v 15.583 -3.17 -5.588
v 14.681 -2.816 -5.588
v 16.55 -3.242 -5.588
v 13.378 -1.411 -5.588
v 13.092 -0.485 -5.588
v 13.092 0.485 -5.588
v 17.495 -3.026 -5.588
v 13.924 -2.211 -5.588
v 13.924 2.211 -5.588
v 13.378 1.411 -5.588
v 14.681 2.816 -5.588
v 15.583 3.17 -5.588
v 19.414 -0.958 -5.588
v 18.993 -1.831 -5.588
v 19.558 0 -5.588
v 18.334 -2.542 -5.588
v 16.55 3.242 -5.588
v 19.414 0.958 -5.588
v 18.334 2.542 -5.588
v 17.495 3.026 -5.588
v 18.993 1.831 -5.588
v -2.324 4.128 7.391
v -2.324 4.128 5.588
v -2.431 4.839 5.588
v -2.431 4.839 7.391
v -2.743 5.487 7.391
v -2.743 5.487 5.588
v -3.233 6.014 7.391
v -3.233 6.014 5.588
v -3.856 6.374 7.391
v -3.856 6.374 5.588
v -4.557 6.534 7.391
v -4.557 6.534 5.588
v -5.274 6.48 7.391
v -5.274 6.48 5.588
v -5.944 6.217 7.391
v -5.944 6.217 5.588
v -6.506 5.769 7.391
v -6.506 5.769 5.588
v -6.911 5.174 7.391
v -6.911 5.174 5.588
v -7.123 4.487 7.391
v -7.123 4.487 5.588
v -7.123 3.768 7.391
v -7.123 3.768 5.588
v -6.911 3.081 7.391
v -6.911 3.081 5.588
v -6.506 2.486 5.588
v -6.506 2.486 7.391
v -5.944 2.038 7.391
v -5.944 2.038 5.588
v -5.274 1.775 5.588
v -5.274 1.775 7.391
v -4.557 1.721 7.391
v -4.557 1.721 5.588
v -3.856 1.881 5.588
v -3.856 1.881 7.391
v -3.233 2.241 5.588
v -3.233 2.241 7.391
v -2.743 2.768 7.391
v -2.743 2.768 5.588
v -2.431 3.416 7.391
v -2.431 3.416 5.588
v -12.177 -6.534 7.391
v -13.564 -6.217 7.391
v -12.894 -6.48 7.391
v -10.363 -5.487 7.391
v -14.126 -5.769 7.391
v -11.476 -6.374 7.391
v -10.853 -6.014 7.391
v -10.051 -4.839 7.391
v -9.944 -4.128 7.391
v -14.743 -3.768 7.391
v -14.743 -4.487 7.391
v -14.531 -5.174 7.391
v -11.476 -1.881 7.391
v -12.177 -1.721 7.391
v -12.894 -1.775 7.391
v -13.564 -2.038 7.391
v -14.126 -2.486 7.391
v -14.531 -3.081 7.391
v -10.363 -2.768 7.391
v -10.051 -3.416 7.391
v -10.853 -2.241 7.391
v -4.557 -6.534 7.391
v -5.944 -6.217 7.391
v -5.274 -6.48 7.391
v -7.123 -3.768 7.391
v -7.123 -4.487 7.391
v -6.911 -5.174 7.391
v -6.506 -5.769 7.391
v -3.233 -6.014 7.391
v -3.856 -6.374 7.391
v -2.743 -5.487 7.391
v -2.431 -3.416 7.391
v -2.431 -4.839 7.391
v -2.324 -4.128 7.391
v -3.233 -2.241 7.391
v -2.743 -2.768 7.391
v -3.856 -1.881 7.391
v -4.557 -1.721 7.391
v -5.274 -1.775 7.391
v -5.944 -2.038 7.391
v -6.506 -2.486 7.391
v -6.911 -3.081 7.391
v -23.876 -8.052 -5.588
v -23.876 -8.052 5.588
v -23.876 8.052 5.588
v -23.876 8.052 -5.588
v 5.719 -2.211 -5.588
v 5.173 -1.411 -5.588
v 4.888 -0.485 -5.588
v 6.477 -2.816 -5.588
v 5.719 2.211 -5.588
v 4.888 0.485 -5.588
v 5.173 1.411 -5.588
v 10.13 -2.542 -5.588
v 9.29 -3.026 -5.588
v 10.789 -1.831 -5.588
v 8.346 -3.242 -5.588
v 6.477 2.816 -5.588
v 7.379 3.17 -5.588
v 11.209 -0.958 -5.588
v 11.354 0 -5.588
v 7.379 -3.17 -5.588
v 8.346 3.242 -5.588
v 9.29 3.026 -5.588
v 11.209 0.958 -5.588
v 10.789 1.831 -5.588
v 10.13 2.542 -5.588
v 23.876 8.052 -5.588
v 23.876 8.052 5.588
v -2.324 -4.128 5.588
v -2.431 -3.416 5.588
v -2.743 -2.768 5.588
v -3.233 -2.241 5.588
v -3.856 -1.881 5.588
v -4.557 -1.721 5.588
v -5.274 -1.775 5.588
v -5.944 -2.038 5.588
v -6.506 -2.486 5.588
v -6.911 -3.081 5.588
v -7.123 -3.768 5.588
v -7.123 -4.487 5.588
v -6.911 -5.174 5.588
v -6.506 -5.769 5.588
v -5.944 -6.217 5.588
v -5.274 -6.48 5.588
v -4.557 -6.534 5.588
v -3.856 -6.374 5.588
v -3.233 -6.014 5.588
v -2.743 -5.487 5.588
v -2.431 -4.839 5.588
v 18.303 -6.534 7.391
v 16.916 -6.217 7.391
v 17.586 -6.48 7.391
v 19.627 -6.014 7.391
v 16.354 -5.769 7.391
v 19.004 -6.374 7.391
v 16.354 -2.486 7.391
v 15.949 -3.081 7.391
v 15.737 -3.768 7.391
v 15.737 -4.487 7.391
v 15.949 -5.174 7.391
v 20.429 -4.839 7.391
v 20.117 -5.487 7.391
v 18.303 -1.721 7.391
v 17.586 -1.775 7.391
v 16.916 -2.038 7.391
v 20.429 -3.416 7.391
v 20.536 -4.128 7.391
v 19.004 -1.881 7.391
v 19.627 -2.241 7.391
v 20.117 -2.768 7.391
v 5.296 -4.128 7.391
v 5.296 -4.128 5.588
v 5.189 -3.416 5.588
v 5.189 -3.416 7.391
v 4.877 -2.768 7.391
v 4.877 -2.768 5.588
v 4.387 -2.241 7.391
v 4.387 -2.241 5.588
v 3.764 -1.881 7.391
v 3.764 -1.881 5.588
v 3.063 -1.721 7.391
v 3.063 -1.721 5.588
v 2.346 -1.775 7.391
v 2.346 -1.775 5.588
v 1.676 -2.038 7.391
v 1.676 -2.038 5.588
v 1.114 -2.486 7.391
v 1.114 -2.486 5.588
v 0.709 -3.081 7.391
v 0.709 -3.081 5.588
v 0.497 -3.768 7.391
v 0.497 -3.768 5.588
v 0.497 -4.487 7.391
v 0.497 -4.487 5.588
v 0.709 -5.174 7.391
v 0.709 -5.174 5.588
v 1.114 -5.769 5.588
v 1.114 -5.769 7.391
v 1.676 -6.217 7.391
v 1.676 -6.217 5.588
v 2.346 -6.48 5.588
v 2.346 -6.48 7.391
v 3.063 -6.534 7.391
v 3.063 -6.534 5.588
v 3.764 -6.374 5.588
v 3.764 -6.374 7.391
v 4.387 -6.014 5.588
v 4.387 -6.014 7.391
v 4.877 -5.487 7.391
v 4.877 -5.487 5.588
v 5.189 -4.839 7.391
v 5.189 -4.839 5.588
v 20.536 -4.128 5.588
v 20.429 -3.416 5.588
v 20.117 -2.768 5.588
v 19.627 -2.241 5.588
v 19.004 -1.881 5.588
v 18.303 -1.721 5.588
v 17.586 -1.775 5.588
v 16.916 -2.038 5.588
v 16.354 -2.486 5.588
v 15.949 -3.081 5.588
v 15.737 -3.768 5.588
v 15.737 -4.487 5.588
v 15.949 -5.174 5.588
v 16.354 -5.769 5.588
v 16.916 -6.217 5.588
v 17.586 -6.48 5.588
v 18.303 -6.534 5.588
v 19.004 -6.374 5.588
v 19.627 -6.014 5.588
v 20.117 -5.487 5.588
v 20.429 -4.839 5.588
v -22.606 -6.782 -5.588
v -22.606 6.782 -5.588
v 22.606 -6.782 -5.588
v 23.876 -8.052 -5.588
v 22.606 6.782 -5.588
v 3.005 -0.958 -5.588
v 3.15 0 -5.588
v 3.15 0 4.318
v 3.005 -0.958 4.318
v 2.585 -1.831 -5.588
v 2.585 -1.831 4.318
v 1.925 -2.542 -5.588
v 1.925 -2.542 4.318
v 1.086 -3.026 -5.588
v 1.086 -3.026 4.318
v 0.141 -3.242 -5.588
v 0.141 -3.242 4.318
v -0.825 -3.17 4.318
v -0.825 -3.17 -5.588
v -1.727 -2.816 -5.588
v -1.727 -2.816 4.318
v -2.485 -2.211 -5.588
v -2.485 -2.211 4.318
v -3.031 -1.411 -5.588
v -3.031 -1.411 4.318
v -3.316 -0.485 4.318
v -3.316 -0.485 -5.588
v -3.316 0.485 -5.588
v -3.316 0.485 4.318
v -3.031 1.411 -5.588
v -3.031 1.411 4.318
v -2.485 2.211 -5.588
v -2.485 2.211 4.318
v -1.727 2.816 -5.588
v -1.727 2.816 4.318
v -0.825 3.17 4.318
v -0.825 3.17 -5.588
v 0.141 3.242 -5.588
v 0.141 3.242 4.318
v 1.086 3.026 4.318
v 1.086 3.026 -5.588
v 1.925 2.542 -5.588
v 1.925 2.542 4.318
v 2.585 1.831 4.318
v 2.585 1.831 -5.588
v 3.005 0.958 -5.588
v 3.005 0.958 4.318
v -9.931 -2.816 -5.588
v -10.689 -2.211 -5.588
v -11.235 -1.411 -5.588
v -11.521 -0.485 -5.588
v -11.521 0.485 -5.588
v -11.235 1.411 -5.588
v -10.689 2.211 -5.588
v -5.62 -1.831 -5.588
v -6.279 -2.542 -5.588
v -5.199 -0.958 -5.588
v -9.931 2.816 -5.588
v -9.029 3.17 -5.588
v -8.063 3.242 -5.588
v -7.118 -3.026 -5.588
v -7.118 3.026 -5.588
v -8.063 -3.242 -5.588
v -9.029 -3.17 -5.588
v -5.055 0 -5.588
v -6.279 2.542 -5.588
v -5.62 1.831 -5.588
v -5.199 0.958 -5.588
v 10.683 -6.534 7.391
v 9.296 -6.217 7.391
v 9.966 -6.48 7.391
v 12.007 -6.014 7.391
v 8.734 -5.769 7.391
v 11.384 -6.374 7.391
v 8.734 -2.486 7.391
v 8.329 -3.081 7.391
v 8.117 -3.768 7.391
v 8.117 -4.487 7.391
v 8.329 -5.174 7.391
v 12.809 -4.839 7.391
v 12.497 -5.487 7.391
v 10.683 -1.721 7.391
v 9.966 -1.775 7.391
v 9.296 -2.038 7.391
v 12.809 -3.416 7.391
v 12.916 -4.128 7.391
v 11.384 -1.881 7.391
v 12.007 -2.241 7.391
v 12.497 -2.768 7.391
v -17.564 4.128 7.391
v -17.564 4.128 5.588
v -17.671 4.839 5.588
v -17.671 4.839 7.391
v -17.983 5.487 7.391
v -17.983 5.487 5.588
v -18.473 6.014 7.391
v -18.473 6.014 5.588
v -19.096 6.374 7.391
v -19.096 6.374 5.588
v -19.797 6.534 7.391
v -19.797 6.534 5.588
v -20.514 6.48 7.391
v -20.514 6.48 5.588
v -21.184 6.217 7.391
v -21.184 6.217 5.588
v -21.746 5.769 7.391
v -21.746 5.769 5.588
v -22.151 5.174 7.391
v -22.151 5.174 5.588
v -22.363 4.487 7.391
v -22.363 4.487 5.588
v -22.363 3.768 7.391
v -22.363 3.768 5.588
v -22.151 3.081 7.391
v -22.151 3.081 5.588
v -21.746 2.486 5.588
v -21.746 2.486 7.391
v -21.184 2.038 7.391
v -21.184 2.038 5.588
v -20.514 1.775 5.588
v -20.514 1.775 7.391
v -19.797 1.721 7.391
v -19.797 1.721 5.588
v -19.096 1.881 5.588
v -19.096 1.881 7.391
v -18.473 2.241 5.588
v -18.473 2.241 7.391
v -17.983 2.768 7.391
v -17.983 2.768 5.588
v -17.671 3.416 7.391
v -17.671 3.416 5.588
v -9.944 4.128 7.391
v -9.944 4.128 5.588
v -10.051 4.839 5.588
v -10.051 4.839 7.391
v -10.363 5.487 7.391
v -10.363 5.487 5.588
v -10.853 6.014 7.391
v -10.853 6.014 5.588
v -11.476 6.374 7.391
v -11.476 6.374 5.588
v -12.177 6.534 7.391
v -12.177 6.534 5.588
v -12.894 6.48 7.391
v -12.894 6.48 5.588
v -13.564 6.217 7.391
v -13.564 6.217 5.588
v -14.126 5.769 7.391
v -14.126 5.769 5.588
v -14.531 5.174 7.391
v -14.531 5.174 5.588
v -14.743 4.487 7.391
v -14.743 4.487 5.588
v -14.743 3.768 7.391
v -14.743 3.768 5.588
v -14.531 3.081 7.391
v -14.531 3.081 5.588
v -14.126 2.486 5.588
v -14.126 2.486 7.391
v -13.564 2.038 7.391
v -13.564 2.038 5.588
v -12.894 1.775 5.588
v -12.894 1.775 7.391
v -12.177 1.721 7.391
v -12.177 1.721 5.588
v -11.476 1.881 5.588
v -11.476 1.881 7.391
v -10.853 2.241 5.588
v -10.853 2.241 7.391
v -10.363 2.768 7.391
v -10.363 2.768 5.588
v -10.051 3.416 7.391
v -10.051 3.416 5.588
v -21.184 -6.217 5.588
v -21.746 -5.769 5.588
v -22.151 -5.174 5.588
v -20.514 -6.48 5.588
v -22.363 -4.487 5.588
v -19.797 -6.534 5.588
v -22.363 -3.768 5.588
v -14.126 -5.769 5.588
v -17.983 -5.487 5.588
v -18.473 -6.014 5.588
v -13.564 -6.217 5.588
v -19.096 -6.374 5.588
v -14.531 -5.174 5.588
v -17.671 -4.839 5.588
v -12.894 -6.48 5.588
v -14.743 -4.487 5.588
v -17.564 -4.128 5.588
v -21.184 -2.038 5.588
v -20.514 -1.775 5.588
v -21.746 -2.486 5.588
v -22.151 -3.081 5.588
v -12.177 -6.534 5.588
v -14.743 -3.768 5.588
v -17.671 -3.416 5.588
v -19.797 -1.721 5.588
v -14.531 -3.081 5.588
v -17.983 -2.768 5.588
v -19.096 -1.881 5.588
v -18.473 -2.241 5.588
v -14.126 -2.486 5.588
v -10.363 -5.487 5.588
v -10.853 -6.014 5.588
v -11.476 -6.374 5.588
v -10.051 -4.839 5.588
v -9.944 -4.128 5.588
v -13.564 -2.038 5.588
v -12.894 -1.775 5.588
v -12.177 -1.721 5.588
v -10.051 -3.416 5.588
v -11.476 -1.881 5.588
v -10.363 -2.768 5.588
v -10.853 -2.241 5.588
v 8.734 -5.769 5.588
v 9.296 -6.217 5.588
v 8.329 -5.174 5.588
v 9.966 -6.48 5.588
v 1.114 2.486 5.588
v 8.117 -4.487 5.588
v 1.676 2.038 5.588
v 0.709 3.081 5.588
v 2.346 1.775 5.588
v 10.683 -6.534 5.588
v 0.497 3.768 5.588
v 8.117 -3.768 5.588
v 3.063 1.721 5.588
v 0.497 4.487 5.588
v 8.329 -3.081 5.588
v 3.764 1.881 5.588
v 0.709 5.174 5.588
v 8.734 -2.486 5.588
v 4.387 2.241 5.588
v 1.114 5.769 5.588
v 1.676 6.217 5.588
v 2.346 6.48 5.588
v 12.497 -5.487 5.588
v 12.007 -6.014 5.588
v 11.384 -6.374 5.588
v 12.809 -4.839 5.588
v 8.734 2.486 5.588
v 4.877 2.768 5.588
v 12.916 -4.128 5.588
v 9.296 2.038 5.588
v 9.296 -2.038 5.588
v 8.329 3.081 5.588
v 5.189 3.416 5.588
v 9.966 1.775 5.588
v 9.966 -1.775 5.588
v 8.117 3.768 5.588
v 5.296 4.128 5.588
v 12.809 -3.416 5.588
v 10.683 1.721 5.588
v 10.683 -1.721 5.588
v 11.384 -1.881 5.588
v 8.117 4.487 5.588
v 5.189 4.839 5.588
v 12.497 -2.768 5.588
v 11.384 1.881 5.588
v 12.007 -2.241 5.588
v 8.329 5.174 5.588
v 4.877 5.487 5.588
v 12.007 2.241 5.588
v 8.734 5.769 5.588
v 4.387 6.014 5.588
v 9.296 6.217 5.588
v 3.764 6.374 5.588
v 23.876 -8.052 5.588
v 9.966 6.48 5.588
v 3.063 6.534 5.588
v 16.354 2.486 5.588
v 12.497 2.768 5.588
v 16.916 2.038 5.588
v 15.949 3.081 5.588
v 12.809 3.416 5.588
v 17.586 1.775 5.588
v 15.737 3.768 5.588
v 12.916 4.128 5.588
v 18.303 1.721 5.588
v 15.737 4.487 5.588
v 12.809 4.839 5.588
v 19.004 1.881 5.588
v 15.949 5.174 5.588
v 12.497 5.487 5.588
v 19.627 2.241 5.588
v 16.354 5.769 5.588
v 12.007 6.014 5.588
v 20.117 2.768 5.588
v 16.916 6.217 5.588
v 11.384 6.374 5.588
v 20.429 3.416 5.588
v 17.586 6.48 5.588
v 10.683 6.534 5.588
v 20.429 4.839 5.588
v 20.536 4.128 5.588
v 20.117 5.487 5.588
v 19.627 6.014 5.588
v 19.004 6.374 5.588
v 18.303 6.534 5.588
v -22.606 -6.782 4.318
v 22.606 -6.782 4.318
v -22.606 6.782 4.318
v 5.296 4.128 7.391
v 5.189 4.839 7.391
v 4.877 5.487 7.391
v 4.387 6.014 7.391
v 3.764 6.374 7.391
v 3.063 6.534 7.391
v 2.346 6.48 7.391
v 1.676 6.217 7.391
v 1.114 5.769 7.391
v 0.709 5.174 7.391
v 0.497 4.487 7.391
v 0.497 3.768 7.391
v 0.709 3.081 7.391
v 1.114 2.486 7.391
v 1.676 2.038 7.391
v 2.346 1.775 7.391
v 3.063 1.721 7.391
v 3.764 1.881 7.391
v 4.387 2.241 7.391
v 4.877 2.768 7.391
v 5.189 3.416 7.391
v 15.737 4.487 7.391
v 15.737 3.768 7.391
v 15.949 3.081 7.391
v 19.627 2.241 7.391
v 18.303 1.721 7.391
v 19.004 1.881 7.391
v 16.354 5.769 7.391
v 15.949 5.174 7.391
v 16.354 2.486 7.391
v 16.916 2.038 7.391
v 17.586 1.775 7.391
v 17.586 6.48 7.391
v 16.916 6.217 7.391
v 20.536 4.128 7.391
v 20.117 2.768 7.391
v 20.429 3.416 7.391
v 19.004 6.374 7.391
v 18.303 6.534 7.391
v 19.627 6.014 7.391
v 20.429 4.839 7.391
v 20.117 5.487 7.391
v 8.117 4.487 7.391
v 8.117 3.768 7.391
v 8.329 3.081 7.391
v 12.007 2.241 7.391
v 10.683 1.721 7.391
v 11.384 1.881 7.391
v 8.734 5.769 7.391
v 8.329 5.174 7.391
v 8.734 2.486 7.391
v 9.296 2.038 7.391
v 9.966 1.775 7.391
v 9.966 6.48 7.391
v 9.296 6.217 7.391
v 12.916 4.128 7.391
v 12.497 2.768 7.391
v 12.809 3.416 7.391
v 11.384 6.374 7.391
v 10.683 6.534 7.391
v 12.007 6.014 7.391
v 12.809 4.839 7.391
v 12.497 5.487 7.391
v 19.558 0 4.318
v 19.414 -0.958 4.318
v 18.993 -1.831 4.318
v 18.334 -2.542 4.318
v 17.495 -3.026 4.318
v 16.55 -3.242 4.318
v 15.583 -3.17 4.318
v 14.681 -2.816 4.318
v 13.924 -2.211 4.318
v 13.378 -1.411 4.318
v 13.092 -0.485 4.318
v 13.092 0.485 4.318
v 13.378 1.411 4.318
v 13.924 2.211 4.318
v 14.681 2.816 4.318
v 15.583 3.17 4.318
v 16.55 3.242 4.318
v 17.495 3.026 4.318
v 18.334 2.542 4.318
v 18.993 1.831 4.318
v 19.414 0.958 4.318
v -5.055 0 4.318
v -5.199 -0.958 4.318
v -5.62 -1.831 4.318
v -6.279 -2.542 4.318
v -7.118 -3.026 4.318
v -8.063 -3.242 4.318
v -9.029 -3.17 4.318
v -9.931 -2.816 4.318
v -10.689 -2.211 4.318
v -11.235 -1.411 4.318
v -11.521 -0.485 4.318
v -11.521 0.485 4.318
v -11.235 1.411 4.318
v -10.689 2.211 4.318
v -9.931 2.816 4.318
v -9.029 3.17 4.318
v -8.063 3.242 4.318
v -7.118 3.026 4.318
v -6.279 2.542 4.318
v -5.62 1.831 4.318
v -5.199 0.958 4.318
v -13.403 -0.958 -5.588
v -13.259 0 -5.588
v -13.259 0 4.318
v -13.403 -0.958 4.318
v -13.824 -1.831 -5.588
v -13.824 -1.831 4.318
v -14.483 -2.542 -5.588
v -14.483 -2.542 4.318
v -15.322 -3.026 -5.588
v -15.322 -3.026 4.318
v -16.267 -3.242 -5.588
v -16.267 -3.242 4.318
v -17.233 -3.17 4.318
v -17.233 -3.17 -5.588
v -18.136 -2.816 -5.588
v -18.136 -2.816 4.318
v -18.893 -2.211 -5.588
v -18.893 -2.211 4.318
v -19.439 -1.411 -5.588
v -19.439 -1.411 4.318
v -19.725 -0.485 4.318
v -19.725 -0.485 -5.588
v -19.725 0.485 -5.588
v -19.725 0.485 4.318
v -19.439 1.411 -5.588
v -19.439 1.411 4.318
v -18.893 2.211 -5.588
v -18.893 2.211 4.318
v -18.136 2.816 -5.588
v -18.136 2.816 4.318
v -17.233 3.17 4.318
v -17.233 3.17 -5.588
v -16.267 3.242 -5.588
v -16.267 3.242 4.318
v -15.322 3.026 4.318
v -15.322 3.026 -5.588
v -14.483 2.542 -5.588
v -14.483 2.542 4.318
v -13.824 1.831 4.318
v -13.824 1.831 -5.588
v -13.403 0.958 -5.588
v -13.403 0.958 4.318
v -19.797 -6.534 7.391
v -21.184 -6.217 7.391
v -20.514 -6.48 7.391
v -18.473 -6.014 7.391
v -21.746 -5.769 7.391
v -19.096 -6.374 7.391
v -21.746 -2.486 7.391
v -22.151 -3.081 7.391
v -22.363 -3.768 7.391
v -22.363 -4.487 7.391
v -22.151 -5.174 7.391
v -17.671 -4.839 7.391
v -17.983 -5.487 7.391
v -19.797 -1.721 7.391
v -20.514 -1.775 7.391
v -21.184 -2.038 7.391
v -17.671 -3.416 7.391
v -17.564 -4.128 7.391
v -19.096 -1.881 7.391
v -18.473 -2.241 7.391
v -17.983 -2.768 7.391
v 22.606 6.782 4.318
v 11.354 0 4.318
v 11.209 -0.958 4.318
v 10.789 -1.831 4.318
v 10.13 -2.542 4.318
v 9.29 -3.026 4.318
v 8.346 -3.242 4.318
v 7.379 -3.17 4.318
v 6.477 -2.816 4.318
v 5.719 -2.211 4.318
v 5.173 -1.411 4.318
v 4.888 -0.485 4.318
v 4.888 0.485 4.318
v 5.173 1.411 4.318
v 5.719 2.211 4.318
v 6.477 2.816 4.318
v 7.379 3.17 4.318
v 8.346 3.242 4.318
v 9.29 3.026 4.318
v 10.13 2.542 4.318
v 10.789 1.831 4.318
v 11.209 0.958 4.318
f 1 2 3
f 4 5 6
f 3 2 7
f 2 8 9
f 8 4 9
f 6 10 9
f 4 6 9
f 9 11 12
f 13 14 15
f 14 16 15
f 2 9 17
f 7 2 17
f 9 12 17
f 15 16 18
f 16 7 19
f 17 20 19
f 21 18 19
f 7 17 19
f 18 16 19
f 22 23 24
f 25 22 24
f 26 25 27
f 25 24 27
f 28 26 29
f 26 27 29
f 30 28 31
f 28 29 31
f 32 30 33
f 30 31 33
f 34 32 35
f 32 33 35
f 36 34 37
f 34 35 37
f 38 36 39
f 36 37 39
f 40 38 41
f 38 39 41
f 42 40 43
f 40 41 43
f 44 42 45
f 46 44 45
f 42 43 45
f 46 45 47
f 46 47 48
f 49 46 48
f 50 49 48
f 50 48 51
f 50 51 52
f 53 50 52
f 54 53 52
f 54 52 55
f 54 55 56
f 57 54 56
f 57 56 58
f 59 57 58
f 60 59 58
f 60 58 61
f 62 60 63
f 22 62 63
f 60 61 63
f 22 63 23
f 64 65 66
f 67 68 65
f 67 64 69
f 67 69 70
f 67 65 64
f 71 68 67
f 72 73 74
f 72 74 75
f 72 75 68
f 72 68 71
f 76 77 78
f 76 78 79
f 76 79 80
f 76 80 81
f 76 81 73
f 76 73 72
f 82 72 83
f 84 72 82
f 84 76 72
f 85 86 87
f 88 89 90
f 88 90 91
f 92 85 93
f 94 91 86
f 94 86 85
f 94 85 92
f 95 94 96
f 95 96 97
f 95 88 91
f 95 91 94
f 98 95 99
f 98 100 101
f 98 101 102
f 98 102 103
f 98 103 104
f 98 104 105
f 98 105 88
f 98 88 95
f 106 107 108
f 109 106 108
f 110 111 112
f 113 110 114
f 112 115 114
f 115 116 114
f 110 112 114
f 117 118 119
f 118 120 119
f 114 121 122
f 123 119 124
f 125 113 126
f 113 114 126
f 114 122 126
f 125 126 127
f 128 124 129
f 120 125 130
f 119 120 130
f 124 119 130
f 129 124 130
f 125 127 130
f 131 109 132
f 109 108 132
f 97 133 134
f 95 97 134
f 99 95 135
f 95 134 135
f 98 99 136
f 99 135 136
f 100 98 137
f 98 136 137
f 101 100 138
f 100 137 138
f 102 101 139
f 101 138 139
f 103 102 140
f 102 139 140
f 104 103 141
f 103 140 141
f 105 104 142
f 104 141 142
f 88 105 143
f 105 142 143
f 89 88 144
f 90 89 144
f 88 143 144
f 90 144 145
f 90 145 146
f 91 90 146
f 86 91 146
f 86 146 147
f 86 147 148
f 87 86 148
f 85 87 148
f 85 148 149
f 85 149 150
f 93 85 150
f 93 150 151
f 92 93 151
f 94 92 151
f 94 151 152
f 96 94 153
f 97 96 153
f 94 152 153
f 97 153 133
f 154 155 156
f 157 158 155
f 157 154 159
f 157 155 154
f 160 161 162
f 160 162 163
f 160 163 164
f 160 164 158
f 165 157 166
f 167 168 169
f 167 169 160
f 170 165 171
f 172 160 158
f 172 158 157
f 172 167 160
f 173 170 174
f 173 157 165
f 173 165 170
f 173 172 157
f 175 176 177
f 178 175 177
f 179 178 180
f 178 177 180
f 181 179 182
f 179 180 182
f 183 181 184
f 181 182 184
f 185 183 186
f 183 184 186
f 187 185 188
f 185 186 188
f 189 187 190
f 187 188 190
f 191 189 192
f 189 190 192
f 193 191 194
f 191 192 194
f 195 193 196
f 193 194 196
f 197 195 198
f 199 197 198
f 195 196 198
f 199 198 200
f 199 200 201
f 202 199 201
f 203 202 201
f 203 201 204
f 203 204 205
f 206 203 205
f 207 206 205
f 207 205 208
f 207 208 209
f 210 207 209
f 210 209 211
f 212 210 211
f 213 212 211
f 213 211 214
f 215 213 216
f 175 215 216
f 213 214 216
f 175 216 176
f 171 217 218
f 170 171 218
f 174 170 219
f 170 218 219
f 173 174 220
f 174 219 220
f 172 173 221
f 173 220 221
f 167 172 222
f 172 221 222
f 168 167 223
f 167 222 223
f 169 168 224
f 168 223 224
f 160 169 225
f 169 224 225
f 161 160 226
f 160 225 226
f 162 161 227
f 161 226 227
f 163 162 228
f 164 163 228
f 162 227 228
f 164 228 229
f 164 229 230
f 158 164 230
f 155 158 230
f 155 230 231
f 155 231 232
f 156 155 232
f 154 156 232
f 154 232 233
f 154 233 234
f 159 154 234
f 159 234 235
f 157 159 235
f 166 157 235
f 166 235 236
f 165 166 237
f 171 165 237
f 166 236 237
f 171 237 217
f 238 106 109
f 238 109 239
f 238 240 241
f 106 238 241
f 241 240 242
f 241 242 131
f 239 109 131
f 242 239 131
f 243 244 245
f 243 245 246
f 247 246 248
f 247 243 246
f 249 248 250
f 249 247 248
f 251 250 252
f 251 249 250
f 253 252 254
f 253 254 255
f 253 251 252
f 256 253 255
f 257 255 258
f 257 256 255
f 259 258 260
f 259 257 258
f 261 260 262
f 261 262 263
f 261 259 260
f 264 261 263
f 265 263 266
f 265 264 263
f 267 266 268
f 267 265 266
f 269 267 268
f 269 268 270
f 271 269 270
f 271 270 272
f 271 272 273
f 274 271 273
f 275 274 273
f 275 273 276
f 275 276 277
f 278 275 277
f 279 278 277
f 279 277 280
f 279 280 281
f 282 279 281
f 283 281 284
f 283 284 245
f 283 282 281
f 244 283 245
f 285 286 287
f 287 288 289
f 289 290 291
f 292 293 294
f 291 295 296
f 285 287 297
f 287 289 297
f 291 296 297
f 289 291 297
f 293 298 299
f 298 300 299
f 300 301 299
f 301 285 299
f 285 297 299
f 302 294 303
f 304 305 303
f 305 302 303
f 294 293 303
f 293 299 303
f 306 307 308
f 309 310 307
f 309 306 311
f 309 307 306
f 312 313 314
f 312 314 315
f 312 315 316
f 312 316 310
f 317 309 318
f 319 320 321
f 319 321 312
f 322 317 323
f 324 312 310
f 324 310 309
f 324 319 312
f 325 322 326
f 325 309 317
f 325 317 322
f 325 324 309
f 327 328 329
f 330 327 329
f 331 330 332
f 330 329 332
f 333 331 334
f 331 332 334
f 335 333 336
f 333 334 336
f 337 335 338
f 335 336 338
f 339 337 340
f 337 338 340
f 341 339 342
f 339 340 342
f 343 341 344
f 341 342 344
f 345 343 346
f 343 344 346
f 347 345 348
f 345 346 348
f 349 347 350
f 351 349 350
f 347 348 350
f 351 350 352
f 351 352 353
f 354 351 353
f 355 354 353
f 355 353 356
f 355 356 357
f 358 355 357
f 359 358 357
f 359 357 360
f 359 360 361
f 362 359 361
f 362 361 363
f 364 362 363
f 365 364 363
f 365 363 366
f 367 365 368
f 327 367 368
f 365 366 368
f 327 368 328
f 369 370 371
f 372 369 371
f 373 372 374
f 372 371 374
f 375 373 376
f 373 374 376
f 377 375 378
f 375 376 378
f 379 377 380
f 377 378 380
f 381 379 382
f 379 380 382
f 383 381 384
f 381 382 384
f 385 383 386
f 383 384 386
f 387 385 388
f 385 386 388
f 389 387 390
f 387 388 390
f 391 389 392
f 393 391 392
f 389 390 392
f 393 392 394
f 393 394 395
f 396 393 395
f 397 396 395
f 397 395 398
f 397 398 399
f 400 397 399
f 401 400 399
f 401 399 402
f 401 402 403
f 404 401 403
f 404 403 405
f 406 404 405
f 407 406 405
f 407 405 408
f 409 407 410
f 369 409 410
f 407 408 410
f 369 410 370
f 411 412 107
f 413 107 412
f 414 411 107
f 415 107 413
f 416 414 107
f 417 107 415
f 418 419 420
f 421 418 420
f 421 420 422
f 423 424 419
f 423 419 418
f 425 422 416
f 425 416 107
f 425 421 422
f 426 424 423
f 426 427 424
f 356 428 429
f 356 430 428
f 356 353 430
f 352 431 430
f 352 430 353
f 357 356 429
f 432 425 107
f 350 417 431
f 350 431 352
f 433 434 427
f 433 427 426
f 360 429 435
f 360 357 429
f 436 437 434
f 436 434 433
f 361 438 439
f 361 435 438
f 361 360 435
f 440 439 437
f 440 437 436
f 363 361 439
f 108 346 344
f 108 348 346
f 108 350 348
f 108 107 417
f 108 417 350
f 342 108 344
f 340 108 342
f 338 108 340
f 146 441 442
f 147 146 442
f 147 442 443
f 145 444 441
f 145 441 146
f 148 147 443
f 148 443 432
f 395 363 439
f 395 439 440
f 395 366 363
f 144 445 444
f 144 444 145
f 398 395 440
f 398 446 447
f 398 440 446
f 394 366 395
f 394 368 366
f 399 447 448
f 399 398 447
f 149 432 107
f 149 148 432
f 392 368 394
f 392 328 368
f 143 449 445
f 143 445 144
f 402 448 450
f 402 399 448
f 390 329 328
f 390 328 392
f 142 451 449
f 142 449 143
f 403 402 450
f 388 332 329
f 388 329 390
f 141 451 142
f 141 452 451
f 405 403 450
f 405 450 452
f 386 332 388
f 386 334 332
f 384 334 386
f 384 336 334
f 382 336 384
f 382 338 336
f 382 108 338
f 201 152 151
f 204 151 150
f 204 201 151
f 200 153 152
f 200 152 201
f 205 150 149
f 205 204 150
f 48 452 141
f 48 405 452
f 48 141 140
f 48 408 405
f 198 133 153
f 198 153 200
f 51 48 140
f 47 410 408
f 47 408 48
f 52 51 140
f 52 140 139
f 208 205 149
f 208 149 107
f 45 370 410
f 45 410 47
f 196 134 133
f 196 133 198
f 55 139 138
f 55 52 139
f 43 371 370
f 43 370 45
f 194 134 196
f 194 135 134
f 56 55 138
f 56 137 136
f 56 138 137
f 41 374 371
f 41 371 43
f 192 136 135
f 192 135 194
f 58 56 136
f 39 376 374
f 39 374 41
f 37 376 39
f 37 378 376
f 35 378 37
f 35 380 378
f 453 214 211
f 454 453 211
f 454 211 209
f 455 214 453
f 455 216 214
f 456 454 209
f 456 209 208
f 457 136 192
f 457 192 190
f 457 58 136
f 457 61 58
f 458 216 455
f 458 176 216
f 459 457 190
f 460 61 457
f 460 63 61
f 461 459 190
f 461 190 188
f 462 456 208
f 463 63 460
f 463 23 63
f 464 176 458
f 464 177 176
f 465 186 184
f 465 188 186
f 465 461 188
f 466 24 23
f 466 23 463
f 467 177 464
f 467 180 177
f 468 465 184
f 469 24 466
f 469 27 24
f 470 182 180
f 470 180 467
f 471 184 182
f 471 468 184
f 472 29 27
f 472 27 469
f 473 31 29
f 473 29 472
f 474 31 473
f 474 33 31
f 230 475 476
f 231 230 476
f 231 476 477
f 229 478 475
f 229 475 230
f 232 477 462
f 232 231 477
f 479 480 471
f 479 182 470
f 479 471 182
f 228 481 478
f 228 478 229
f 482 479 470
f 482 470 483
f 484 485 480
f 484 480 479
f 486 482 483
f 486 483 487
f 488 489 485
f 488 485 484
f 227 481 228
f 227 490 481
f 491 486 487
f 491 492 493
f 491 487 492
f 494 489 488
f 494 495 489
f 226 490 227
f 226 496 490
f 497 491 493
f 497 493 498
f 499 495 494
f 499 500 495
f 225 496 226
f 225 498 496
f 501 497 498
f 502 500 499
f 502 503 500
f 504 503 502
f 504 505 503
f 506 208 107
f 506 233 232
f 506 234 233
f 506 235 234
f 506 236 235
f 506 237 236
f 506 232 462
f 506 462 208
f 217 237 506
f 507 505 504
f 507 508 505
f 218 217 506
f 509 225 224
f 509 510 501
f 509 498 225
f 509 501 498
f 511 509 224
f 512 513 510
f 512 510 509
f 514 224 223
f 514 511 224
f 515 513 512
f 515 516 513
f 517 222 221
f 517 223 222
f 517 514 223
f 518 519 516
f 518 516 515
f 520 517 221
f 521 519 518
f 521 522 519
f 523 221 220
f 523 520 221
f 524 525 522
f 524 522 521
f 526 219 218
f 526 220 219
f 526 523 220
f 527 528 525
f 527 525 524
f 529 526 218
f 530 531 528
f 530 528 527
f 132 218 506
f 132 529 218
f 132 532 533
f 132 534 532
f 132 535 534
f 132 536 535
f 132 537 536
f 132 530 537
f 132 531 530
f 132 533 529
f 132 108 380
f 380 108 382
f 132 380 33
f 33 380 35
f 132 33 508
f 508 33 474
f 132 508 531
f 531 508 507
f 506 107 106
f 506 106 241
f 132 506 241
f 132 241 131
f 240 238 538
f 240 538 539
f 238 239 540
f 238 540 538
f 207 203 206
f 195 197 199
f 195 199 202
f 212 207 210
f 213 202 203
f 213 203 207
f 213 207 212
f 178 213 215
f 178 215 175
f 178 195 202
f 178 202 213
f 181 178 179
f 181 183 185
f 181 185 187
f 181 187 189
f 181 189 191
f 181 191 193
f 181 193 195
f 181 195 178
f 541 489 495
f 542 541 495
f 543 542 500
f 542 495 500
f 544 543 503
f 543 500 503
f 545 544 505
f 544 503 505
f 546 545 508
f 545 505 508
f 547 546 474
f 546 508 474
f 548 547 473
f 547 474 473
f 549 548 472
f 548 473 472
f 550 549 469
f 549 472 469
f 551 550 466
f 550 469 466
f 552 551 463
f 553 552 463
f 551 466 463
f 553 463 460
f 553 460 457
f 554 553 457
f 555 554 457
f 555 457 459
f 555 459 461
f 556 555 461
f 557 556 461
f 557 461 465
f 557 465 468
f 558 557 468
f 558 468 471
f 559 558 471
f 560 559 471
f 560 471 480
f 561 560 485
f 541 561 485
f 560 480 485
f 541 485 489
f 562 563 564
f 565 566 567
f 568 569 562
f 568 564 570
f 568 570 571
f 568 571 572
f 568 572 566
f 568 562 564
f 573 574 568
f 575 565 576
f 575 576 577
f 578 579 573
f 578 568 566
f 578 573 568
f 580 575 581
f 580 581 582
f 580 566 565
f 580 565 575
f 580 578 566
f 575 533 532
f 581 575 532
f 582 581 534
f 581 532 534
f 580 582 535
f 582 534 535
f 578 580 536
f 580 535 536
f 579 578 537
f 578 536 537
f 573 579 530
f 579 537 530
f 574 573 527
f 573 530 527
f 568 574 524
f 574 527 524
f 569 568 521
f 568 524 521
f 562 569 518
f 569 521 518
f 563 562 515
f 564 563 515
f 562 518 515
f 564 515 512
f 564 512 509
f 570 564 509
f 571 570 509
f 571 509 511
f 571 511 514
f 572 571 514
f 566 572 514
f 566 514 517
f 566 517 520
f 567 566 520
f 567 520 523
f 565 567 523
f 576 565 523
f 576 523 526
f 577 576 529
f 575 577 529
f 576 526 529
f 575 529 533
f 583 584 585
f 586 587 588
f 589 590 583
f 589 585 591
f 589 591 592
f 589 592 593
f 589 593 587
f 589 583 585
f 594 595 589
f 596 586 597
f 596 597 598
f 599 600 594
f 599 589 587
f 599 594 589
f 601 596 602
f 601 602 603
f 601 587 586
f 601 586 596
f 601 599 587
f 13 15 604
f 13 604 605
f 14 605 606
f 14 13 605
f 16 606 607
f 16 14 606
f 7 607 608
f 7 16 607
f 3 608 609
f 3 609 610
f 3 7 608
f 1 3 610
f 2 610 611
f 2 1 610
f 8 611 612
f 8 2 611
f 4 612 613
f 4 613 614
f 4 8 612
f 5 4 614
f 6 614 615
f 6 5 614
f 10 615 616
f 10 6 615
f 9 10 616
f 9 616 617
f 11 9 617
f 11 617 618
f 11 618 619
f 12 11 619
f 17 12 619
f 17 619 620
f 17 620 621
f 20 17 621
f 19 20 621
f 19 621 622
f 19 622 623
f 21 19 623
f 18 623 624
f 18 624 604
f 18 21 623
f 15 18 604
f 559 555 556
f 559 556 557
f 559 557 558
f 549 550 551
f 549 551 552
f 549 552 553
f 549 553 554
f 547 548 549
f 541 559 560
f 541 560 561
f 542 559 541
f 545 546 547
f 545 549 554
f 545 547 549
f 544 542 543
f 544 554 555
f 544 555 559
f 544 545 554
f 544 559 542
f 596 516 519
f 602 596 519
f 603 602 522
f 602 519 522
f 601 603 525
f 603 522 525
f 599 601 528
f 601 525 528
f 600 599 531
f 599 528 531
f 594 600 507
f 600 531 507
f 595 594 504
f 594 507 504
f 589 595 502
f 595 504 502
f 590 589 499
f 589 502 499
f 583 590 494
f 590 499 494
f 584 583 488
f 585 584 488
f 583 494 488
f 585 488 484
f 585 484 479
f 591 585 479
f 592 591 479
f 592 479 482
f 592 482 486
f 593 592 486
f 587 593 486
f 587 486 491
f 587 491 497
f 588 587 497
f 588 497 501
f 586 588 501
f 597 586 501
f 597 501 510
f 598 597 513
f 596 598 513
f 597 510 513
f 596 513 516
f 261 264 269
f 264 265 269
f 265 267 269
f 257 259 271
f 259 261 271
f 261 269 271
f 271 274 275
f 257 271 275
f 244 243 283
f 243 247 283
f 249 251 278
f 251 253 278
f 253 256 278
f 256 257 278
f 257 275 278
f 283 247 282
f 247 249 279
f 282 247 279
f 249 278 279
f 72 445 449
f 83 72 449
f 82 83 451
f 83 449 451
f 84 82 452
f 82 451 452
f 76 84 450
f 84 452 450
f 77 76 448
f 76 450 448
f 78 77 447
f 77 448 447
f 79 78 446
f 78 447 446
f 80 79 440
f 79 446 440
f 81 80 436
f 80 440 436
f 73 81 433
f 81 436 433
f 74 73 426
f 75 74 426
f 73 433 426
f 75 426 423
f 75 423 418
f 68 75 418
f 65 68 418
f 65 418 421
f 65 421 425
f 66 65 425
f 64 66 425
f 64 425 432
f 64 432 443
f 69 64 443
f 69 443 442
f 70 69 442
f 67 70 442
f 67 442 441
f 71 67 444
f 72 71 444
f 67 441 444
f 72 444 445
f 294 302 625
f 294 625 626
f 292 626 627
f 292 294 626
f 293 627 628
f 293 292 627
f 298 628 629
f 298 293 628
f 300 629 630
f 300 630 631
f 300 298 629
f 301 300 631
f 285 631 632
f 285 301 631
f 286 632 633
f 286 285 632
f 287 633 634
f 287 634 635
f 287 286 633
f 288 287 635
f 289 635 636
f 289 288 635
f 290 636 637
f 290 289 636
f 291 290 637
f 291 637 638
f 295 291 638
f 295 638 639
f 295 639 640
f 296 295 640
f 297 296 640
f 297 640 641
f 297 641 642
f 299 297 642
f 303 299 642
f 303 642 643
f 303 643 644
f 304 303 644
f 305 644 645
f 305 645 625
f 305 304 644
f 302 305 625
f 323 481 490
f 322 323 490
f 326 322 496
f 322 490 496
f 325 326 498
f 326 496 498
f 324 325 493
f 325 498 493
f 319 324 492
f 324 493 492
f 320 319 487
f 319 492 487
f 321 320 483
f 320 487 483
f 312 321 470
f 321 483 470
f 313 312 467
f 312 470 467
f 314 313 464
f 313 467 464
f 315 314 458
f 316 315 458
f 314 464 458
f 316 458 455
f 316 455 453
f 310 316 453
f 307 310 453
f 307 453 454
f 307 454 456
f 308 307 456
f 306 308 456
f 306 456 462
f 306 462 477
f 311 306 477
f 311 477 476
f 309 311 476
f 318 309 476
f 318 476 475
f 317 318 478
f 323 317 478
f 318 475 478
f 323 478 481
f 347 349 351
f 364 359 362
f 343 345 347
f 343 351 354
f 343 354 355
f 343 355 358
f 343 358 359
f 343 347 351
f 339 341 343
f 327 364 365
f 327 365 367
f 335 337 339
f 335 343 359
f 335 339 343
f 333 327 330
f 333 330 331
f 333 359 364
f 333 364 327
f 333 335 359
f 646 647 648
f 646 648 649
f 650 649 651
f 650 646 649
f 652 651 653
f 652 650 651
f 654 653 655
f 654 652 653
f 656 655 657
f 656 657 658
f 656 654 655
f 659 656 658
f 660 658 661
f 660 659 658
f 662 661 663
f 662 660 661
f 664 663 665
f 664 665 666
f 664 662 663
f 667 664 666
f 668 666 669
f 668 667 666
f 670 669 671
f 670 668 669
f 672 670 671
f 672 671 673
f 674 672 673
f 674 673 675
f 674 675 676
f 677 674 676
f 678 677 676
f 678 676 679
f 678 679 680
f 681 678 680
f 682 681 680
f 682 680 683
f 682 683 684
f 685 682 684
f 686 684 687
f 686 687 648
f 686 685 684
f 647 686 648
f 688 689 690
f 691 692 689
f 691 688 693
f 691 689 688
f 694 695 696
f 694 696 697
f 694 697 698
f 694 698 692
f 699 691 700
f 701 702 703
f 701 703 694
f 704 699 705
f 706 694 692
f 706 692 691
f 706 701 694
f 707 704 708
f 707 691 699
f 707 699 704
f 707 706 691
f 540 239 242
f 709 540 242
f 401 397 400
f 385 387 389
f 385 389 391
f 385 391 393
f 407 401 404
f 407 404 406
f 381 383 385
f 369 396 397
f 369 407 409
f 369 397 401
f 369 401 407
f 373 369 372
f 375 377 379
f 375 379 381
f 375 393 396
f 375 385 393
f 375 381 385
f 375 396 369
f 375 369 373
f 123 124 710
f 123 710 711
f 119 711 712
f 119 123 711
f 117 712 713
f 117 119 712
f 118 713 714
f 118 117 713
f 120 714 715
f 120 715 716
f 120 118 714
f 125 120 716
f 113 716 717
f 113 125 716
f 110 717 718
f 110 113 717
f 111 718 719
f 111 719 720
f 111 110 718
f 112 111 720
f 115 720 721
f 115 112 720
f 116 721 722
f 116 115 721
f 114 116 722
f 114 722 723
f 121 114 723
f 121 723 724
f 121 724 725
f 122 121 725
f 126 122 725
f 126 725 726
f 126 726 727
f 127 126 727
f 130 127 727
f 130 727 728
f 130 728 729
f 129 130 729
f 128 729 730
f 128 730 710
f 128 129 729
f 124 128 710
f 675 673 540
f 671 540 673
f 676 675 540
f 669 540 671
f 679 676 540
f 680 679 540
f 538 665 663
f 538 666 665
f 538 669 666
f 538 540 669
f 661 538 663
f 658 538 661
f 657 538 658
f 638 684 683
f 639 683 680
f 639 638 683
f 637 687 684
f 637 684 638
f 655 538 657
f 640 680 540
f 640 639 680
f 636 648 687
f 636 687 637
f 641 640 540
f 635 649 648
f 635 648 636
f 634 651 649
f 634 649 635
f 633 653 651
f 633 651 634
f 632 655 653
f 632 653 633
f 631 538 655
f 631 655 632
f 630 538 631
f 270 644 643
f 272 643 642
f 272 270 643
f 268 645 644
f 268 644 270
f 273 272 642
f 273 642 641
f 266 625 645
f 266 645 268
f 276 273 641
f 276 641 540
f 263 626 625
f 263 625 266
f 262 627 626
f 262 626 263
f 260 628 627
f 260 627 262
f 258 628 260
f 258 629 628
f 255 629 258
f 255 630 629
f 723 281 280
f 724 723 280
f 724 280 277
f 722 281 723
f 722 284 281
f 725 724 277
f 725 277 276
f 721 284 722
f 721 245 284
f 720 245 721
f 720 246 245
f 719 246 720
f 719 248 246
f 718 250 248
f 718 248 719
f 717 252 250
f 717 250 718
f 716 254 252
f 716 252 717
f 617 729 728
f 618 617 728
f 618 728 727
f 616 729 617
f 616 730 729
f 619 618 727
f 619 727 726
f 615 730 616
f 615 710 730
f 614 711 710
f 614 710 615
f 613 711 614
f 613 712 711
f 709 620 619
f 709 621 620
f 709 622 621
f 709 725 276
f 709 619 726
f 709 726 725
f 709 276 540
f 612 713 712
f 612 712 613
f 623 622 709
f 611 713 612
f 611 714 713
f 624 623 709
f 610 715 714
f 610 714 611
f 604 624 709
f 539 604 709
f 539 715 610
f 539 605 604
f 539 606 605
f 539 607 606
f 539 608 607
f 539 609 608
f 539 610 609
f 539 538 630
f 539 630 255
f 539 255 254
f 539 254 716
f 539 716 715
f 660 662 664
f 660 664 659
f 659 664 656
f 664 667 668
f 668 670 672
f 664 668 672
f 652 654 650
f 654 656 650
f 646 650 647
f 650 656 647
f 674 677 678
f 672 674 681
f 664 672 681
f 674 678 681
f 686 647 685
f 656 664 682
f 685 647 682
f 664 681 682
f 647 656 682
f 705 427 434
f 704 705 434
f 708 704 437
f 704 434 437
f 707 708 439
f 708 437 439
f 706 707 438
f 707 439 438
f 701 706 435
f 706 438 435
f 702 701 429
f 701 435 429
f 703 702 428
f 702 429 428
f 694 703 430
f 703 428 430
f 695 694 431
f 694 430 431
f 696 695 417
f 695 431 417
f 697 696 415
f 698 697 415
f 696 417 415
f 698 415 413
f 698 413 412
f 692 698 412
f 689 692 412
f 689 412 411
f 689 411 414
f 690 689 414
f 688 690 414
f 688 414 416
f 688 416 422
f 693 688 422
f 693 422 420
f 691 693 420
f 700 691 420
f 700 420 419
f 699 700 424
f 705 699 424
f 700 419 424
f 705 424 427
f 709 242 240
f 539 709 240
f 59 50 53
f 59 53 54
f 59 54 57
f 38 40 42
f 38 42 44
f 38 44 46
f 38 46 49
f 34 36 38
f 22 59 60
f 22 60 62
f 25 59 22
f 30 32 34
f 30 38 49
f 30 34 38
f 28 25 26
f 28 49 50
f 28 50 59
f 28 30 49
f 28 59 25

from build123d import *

# Parameters (mm, degrees)
F0_W     = 47.752
F0_H     = 16.1036
F1_DEPTH = 5.588
F2_R     = 2.413
F3_DEPTH = 1.8034
F5_W     = 45.212
F5_H     = 13.5636
F5_R     = 3.2512
F6_DEPTH = 9.906


with BuildPart() as f1:
    # F0 (on Top) → F1 (new body, symmetric)
    with BuildSketch(Plane.XY):
        Rectangle(F0_W, F0_H)
    extrude(amount=F1_DEPTH, both=True)

    # F2 (on face) → F3 (join)
    with BuildSketch(Plane.XY.offset(5.588)):
        with Locations((-19.9771, 4.1275)):
            Circle(F2_R)
        with Locations((-12.3571, 4.1275)):
            Circle(F2_R)
        with Locations((-4.7371, 4.1275)):
            Circle(F2_R)
        with Locations((2.8829, 4.1275)):
            Circle(F2_R)
        with Locations((10.5029, 4.1275)):
            Circle(F2_R)
        with Locations((-19.9771, -4.1275)):
            Circle(F2_R)
        with Locations((-12.3571, -4.1275)):
            Circle(F2_R)
        with Locations((-4.7371, -4.1275)):
            Circle(F2_R)
        with Locations((2.8829, -4.1275)):
            Circle(F2_R)
        with Locations((10.5029, -4.1275)):
            Circle(F2_R)
        with Locations((18.1229, 4.1275)):
            Circle(F2_R)
        with Locations((18.1229, -4.1275)):
            Circle(F2_R)
    extrude(amount=F3_DEPTH)

    # F5 (on face) → F6 (cut)
    with BuildSketch(Plane(origin=(0, 0, -5.588), x_dir=(1, 0, 0), z_dir=(0, 0, -1))):
        Rectangle(F5_W, F5_H)
        with Locations((-16.51, 0)):
            Circle(F5_R, mode=Mode.SUBTRACT)
        with Locations((-8.3058, 0)):
            Circle(F5_R, mode=Mode.SUBTRACT)
        with Locations((-0.1016, 0)):
            Circle(F5_R, mode=Mode.SUBTRACT)
        with Locations((8.1026, 0)):
            Circle(F5_R, mode=Mode.SUBTRACT)
        with Locations((16.3068, 0)):
            Circle(F5_R, mode=Mode.SUBTRACT)
    extrude(amount=-F6_DEPTH, mode=Mode.SUBTRACT)


solid = f1.part
